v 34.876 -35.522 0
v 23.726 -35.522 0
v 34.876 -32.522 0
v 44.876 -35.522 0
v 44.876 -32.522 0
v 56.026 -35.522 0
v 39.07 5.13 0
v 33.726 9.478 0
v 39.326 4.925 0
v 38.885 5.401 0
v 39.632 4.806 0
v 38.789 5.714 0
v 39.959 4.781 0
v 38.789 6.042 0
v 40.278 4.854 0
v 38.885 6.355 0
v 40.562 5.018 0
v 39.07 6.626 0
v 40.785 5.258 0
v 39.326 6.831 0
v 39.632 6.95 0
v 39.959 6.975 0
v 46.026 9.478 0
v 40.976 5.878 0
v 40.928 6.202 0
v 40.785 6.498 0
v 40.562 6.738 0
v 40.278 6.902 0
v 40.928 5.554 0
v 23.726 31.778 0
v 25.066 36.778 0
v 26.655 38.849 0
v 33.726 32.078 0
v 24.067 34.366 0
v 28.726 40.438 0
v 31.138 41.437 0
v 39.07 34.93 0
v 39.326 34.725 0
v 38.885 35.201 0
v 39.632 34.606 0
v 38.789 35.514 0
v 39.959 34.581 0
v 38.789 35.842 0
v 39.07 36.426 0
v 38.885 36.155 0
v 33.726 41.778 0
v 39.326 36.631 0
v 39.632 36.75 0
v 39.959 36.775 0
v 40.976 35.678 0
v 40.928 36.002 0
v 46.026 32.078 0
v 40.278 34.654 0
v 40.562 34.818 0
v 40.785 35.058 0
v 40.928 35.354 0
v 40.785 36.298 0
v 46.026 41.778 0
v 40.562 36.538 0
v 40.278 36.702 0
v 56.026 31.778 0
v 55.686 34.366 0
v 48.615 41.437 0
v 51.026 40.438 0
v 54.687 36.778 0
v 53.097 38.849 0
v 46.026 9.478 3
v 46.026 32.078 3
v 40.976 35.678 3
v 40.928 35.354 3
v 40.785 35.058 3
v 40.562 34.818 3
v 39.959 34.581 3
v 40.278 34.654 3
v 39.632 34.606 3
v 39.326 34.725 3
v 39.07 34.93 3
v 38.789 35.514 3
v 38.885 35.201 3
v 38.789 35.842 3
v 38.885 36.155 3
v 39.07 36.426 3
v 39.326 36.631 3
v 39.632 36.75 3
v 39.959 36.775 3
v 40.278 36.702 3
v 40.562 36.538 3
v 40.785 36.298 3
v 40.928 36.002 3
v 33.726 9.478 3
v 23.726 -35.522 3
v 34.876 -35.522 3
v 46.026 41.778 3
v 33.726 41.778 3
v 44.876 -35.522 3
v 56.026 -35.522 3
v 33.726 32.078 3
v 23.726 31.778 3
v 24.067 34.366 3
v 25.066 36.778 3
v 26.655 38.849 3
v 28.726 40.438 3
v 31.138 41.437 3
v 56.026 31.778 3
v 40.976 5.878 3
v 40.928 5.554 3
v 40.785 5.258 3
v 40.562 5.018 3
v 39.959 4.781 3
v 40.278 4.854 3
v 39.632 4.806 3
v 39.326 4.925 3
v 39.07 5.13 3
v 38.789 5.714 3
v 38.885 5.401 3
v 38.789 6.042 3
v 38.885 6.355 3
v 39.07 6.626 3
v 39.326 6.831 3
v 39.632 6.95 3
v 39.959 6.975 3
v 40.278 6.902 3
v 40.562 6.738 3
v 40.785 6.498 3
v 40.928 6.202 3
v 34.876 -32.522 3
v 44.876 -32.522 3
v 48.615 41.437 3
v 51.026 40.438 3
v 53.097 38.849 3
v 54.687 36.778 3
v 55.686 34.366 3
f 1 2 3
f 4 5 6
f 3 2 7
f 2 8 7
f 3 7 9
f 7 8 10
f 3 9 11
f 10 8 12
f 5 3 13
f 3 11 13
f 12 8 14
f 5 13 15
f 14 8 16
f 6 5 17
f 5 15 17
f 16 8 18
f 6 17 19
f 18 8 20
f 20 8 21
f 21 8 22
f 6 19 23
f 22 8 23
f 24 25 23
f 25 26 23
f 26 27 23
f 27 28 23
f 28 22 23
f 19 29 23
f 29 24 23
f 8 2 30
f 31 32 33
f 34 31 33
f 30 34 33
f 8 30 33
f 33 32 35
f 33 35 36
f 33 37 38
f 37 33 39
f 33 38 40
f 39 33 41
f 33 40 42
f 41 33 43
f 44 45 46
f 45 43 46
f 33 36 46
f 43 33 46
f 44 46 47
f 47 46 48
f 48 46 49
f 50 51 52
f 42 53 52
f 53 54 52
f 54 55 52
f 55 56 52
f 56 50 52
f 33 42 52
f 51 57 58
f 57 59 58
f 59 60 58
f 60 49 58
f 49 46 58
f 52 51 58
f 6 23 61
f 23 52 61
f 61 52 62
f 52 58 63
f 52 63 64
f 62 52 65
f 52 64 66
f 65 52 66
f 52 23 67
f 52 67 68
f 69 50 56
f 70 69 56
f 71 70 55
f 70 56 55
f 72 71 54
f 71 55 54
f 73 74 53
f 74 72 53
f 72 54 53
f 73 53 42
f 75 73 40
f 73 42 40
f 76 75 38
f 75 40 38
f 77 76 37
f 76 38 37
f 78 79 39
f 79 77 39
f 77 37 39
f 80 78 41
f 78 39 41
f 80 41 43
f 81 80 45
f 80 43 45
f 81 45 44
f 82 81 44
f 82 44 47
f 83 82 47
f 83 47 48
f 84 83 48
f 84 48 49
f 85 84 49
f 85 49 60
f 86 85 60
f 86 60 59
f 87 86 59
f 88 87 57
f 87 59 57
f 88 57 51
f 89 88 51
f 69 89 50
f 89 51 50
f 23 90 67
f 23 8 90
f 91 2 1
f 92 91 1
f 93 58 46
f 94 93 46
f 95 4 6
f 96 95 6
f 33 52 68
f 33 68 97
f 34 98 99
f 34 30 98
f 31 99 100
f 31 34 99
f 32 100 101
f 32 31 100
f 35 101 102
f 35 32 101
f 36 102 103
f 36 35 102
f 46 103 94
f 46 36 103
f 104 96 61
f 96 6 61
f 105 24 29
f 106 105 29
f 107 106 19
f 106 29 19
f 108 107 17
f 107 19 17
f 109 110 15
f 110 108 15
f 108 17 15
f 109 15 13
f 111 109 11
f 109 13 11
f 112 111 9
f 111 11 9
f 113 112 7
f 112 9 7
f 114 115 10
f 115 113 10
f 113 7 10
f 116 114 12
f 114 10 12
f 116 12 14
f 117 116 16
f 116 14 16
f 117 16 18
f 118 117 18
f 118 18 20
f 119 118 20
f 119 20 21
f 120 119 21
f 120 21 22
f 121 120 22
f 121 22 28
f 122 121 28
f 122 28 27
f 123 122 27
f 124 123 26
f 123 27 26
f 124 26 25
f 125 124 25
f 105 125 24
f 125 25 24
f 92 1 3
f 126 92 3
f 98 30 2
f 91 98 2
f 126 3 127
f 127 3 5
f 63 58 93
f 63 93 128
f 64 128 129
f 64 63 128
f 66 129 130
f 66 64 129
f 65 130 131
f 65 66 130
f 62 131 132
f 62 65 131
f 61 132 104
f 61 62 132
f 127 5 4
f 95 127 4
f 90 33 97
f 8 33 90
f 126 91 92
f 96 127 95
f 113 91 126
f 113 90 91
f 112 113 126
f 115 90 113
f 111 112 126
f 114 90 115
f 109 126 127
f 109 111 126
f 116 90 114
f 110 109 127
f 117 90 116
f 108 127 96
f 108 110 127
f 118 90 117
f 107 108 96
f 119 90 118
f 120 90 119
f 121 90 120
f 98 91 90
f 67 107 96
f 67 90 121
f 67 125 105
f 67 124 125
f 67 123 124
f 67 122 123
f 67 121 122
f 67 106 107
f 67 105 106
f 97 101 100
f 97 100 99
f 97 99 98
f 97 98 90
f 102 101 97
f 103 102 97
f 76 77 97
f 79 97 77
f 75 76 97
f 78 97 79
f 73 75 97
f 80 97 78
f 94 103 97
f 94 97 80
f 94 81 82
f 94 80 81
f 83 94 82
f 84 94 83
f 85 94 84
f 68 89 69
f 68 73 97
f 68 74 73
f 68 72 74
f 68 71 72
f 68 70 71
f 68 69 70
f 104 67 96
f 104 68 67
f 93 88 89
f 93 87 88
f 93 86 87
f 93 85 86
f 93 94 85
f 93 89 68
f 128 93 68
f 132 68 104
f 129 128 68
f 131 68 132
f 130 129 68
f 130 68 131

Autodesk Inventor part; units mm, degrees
ref_plane "YZ Plane" through (0, 0, 0) normal (1, 0, 0) x (0, 1, 0)
ref_plane "XZ Plane" through (0, 0, 0) normal (0, 1, 0) x (-1, 0, 0)
ref_plane "XY Plane" through (0, 0, 0) normal (0, 0, 1) x (1, 0, 0)
sketch "Sketch1" plane through (0, 0, 0) normal (0, 0, 1) x (1, 0, 0)
  line L0 (46.0264, 41.778) -> (33.7264, 41.778)
  line L1 (23.7264, 31.778) -> (23.7264, -35.522)
  line L2 (56.0264, -35.522) -> (56.0264, 31.778)
  line L3 (46.0264, 32.078) -> (33.7264, 32.078)
  line L4 (33.7264, 32.078) -> (33.7264, 9.478)
  line L5 (33.7264, 9.478) -> (46.0264, 9.478)
  line L6 (46.0264, 9.478) -> (46.0264, 32.078)
  line L7 (46.0264, 32.078) -> (33.7264, 32.078) construction
  line L8 (33.7264, 32.078) -> (33.7264, 36.778) construction
  line L9 (33.7264, 36.778) -> (46.0264, 36.778) construction
  line L10 (46.0264, 36.778) -> (46.0264, 32.078) construction
  line L11 (39.8764, 36.778) -> (39.8764, 32.078) construction
  circle A0 centre (39.8764, 35.678) radius 1.1
  line L12 (46.0264, 9.478) -> (33.7264, 9.478) construction
  line L13 (33.7264, 9.478) -> (33.7264, 4.778) construction
  line L14 (33.7264, 4.778) -> (46.0264, 4.778) construction
  line L15 (46.0264, 4.778) -> (46.0264, 9.478) construction
  line L16 (39.8764, 4.778) -> (39.8764, 9.478) construction
  circle A1 centre (39.8764, 5.878) radius 1.1
  arc A2 (33.7264, 41.778) -> (23.7264, 31.778) centre (33.7264, 31.778) ccw
  arc A3 (56.0264, 31.778) -> (46.0264, 41.778) centre (46.0264, 31.778) ccw
  line L17 (34.8764, -35.522) -> (34.8764, -32.522)
  line L18 (34.8764, -32.522) -> (44.8764, -32.522)
  line L19 (44.8764, -32.522) -> (44.8764, -35.522)
  line L20 (23.7264, -35.522) -> (34.8764, -35.522)
  line L21 (44.8764, -35.522) -> (56.0264, -35.522)
  point P0 (0, 0)
  dimension "d0" = 12.3
  dimension "d1" = 22.6
  dimension "d2" = 4.7
  dimension "d3" = 1.1
  dimension "d4" = 4.7
  dimension "d5" = 1.1
  dimension "d7" = 5
  dimension "d8" = 10
  dimension "d9" = 10
  dimension "d10" = 10
  dimension "d11" = 32.3
  dimension "d12" = 10
  dimension "d13" = 11.15
  dimension "d14" = 11.15
  dimension "d17" = 45
  dimension "d18" = 45
  dimension "d20" = 42
  dimension "d21" = 12.3
  dimension "d22" = 12.3
extrude "Extrusion1" add sketch "Sketch1" along normal blind 3
properties part number "Stutze_Servo"
